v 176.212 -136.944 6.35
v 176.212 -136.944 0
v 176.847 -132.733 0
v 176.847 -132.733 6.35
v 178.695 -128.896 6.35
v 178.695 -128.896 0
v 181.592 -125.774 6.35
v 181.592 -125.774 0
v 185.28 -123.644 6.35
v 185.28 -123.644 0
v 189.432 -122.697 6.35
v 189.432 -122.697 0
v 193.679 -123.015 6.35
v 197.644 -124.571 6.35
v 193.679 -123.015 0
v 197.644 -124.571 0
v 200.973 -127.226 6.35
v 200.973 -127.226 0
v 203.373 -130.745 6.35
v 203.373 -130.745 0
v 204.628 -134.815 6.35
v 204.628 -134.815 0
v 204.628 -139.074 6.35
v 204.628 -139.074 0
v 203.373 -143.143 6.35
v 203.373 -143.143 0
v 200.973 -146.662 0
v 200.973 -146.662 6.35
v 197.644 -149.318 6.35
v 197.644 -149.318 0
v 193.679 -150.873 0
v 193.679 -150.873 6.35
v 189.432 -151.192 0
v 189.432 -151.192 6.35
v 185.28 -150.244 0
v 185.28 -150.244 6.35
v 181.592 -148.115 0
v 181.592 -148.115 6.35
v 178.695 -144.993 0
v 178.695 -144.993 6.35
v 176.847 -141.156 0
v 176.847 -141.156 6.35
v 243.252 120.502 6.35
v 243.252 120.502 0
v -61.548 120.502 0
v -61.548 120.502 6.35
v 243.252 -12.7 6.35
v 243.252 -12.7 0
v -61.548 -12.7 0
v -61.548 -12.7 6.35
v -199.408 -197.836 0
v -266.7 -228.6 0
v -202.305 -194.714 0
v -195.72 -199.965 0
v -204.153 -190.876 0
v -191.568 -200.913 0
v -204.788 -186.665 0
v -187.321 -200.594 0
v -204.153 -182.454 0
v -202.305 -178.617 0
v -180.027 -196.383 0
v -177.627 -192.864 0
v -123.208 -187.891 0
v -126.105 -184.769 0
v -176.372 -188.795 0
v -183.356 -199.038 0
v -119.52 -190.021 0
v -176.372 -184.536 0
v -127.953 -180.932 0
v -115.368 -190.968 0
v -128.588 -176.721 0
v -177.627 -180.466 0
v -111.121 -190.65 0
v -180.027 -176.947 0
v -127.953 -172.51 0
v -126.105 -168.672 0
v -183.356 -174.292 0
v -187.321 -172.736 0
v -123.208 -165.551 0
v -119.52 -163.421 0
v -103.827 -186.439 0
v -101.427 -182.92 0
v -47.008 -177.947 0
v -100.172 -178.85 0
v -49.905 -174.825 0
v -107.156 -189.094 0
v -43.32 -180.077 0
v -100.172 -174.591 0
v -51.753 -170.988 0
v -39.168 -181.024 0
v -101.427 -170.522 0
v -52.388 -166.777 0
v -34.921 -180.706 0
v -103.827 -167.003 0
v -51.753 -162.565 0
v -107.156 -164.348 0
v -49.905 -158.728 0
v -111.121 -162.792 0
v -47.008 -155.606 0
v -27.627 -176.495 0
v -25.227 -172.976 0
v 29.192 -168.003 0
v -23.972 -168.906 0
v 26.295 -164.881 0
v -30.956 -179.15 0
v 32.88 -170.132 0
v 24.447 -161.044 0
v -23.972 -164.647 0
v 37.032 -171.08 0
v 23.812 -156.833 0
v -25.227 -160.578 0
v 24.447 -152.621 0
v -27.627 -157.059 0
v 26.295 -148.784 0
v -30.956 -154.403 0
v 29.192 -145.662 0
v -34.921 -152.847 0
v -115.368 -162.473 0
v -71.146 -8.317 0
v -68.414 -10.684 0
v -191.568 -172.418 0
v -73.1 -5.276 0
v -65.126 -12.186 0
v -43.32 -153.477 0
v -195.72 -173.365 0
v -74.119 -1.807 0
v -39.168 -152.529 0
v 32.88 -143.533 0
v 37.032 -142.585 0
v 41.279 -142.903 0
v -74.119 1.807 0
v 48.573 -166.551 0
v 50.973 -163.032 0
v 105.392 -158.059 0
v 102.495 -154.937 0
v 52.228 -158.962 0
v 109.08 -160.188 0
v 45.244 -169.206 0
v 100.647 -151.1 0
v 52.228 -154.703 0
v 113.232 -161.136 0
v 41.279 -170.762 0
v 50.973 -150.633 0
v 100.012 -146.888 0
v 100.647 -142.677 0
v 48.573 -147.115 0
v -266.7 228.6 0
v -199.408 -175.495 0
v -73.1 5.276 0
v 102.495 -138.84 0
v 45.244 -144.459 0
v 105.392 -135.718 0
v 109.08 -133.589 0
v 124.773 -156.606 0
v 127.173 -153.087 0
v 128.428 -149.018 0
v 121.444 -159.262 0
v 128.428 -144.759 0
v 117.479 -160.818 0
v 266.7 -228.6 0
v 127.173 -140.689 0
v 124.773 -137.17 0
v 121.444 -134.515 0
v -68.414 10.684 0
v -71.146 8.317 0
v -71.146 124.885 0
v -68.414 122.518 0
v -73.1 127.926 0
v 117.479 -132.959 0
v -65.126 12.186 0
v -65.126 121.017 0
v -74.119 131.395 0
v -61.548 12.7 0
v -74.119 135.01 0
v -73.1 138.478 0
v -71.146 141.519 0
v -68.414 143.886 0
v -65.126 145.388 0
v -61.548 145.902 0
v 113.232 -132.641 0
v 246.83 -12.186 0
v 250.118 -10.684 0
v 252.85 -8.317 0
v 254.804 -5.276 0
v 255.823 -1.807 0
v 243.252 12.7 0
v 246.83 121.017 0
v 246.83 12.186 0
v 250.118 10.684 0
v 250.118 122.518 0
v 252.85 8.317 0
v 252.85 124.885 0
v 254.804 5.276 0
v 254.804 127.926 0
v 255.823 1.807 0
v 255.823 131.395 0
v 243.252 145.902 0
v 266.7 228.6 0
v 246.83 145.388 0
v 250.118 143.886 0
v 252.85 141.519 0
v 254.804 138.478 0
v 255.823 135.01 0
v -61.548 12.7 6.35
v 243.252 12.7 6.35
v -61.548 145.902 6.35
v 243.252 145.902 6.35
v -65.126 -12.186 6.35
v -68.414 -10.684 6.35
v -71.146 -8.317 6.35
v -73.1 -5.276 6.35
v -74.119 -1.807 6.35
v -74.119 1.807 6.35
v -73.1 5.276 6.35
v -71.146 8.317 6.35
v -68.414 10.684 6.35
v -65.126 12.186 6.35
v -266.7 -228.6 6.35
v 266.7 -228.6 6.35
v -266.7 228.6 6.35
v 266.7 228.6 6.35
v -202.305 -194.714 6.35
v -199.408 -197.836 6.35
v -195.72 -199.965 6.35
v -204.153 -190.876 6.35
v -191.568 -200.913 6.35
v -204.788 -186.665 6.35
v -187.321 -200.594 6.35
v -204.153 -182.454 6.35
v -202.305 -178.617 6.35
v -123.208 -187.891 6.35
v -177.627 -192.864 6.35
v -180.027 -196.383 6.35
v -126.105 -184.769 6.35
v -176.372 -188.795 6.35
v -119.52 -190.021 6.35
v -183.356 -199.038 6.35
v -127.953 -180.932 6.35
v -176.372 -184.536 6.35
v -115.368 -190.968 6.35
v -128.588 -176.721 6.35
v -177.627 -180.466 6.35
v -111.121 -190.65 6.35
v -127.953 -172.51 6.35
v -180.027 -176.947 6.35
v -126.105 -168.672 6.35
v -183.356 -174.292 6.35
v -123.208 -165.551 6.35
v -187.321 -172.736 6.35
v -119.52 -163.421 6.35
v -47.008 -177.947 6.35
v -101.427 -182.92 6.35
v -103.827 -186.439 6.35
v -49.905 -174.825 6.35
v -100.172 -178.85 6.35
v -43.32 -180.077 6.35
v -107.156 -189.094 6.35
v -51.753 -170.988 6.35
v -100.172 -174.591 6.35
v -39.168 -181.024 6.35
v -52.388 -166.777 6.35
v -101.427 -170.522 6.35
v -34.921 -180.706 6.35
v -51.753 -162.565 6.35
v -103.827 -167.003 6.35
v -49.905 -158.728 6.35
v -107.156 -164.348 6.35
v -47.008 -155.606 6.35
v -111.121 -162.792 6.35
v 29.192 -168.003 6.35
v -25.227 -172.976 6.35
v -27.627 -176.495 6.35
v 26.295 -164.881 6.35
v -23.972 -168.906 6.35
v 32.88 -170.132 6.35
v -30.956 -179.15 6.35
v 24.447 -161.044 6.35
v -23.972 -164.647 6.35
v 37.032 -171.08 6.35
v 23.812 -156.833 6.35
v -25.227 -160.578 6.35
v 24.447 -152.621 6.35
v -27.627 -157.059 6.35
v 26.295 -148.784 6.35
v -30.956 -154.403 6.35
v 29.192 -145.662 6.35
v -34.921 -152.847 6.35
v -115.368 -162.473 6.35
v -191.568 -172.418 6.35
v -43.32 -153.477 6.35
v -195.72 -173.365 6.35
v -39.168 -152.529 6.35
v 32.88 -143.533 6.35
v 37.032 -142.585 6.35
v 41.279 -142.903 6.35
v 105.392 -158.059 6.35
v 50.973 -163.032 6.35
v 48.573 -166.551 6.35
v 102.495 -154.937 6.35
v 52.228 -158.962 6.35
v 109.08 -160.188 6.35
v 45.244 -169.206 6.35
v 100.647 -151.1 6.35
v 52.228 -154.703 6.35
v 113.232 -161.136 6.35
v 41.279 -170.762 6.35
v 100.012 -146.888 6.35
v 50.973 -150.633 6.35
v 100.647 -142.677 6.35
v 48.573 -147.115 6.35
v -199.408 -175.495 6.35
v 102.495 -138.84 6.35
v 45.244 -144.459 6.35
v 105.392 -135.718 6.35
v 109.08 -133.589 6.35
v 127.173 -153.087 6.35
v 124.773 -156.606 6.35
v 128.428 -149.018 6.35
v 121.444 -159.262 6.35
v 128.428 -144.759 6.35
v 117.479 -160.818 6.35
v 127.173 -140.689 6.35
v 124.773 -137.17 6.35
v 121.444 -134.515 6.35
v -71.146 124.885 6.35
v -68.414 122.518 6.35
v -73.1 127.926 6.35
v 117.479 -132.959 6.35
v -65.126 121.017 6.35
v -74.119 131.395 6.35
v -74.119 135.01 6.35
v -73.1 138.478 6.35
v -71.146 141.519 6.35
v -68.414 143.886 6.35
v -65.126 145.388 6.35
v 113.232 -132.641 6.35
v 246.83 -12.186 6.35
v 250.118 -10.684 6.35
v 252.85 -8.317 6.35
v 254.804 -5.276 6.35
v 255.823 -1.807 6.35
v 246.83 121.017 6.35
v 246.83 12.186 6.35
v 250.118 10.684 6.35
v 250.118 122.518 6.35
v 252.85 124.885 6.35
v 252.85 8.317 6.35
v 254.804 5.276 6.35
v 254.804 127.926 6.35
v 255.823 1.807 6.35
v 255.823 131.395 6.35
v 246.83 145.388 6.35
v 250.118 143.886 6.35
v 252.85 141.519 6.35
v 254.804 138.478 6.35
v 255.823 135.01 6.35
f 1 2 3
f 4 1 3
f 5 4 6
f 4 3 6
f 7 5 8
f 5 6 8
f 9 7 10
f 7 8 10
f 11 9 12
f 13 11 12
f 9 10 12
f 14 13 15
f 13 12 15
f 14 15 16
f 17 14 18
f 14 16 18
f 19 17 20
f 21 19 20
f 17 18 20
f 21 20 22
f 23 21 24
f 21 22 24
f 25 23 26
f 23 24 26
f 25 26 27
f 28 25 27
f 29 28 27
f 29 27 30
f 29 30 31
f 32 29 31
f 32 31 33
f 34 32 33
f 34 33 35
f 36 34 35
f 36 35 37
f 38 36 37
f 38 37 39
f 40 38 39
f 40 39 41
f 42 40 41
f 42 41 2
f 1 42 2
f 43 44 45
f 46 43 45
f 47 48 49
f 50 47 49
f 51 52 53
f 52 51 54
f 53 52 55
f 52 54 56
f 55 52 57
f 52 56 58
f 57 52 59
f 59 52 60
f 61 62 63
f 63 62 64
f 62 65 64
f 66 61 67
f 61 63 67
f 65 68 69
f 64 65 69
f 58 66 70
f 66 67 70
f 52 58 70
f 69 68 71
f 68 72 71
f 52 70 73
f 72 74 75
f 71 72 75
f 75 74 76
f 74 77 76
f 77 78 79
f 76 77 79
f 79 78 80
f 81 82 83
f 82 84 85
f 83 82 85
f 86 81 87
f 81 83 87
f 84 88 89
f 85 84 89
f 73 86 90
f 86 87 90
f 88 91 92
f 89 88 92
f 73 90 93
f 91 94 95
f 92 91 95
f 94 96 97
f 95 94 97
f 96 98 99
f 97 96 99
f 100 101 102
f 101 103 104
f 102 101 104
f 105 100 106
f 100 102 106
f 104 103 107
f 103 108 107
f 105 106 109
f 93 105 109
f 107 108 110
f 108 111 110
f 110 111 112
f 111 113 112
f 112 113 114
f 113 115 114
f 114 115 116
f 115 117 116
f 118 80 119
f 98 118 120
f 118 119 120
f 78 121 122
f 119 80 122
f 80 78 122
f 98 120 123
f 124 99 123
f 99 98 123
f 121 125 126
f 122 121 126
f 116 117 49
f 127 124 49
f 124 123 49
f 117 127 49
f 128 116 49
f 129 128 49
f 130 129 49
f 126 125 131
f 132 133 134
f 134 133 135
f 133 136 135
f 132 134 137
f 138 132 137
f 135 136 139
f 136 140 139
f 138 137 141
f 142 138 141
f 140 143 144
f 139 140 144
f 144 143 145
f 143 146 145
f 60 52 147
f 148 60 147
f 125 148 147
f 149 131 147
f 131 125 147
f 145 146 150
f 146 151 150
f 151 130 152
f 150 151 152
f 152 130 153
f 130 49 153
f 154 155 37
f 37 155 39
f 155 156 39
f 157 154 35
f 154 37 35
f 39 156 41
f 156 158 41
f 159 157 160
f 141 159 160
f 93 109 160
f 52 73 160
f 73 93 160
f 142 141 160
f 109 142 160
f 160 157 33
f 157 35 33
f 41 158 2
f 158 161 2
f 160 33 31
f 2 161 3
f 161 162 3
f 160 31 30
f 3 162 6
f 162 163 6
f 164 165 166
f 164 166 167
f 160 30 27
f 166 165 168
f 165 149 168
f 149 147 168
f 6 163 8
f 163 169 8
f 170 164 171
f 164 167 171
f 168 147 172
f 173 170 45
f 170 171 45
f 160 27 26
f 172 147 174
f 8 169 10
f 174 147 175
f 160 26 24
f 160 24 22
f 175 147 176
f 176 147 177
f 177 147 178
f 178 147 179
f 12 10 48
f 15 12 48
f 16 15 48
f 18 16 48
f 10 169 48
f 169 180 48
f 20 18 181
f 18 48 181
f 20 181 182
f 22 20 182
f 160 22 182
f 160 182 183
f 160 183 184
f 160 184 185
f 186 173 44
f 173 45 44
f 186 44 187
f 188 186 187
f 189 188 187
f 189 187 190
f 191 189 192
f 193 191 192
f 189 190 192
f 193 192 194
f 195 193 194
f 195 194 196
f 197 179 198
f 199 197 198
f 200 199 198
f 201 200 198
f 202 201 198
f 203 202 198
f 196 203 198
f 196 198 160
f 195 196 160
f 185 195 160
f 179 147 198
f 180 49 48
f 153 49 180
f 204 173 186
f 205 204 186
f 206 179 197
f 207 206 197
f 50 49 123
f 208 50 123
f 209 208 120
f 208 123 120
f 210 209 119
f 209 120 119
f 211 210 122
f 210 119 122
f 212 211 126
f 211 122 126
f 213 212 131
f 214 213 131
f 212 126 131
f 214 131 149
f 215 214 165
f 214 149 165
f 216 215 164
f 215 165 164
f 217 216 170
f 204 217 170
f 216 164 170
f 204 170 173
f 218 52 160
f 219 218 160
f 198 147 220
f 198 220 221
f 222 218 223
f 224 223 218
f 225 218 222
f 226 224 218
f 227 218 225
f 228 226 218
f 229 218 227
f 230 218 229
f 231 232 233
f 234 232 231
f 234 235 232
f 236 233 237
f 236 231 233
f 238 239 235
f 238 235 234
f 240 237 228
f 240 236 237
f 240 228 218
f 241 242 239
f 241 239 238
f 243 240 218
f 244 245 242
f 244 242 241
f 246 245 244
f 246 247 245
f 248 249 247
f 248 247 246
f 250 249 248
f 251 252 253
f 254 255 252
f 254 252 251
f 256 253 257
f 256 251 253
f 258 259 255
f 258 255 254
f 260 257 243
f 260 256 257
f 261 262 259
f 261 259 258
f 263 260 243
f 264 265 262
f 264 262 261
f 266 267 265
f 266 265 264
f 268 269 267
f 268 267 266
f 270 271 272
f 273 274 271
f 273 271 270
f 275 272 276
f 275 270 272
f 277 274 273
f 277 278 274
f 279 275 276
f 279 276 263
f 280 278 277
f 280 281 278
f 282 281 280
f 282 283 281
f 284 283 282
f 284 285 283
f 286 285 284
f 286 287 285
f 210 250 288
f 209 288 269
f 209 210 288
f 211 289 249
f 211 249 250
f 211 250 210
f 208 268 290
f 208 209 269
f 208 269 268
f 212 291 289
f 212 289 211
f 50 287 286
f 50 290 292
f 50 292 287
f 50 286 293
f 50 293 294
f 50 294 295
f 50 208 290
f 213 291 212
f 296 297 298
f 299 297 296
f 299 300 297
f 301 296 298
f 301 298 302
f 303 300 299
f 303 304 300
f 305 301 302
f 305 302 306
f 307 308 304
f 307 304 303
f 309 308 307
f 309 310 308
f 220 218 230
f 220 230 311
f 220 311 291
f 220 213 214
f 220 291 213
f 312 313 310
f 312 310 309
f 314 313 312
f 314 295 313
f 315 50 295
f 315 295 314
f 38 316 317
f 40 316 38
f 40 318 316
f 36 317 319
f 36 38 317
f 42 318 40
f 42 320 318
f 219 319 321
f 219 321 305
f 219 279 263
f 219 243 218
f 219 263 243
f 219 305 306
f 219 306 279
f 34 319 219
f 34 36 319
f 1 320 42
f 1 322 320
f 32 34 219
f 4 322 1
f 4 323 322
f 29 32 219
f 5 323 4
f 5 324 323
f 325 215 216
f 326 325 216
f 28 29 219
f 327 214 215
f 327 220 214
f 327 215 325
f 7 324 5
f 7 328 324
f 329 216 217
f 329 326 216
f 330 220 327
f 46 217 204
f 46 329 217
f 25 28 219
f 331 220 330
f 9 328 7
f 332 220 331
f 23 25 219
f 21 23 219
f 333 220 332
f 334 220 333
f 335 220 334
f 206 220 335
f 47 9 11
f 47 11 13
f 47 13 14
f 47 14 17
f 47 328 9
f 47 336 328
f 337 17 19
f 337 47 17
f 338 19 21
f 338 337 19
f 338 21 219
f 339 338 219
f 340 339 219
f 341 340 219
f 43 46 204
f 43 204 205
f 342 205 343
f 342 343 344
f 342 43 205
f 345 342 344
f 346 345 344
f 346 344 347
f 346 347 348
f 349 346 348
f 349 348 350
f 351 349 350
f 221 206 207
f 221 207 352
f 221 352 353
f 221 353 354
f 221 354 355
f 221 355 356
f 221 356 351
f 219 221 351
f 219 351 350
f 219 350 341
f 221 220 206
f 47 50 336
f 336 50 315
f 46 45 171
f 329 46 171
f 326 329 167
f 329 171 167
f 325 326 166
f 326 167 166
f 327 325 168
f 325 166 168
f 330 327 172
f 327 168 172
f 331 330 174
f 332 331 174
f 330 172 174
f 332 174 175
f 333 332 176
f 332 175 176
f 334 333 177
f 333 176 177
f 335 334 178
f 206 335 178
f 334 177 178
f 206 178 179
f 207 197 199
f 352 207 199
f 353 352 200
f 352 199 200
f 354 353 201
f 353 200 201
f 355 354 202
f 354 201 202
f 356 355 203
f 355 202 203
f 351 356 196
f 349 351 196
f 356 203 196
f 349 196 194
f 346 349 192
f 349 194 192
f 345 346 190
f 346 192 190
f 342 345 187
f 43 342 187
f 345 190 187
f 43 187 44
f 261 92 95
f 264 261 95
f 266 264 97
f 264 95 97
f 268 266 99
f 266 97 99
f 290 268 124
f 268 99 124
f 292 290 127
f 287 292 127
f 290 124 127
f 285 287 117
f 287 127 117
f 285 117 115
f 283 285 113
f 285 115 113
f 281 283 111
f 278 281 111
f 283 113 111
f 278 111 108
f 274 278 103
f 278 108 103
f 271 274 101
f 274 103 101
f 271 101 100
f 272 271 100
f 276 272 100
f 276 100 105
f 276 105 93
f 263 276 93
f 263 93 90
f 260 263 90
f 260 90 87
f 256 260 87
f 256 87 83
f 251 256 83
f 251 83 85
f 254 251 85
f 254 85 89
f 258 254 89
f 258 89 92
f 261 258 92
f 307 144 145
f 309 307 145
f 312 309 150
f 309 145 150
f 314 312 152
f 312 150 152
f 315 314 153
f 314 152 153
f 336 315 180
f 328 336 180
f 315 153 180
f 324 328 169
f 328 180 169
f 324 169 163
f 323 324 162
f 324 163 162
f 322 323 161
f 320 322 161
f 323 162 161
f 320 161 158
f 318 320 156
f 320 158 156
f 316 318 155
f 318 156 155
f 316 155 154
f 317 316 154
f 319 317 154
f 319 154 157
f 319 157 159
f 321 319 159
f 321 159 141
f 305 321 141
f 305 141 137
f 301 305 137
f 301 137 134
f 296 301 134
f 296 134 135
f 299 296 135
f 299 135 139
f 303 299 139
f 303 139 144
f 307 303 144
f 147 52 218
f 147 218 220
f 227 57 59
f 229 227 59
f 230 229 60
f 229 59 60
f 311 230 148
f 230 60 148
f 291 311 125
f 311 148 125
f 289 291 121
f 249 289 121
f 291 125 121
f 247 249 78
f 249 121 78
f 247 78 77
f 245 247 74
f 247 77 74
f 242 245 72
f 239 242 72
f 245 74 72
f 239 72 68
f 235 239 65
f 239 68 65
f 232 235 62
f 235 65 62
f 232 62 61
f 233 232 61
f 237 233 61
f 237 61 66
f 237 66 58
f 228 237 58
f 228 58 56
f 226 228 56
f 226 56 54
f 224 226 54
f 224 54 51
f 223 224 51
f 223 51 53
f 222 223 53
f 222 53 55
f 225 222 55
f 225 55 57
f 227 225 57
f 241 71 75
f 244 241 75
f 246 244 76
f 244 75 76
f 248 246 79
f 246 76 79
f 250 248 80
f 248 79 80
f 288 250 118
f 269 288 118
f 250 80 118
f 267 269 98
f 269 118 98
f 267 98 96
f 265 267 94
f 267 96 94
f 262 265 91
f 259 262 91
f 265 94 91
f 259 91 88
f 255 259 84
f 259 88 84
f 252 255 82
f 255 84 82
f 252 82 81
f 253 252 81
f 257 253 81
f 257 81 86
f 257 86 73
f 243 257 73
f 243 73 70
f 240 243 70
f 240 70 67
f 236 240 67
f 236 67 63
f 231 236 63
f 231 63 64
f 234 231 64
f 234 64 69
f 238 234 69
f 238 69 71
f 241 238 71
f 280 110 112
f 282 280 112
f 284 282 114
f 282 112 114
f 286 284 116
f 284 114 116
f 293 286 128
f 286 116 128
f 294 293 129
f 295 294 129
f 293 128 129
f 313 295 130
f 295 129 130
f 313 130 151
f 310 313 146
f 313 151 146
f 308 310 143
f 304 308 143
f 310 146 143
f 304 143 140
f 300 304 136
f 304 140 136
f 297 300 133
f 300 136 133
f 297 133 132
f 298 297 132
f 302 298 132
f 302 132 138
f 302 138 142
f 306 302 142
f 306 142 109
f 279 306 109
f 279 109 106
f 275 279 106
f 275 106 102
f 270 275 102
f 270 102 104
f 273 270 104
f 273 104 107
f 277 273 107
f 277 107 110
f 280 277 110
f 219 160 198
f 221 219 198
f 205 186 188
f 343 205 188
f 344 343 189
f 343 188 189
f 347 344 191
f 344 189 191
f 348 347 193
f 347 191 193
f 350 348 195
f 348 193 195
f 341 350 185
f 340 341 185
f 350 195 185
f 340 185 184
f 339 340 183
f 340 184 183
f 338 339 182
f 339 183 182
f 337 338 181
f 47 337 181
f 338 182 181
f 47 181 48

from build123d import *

# Parameters (mm, degrees)
SKETCH1_W           = 533.4
SKETCH1_H           = 457.2
BOSS_EXTRUDE4_DEPTH = 6.35
SKETCH3_R           = 14.2875
CUT_EXTRUDE2_DEPTH  = 12.7


with BuildPart() as part:
    # Sketch1 → Boss-Extrude4 (new body)
    with BuildSketch(Plane.XY):
        Rectangle(SKETCH1_W, SKETCH1_H)
        with BuildLine():
            Line((-61.54804751, 145.902211593), (243.25195249, 145.902211593))
            ThreePointArc((243.25195249, 145.902211593), (255.95195249, 133.202211593), (243.25195249, 120.502211593))
            Line((243.25195249, 120.502211593), (-61.54804751, 120.502211593))
            ThreePointArc((-61.54804751, 120.502211593), (-74.24804751, 133.202211593), (-61.54804751, 145.902211593))
        make_face(mode=Mode.SUBTRACT)
        with BuildLine():
            Line((-61.54804751, 12.7), (243.25195249, 12.7))
            ThreePointArc((243.25195249, 12.7), (255.95195249, 0), (243.25195249, -12.7))
            Line((243.25195249, -12.7), (-61.54804751, -12.7))
            ThreePointArc((-61.54804751, -12.7), (-74.24804751, 0), (-61.54804751, 12.7))
        make_face(mode=Mode.SUBTRACT)
    extrude(amount=BOSS_EXTRUDE4_DEPTH)

    # Sketch3 → Cut-Extrude2 (cut)
    with BuildSketch(Plane(origin=(0, 0, 0), x_dir=(-1, 0, 0), z_dir=(0, 0, -1))):
        with Locations((-190.5, -136.944186205)):
            Circle(SKETCH3_R)
        with Locations((-114.3, -146.88837241)):
            Circle(SKETCH3_R)
        with Locations((-38.1, -156.832558615)):
            Circle(SKETCH3_R)
        with Locations((38.1, -166.77674482)):
            Circle(SKETCH3_R)
        with Locations((114.3, -176.720931025)):
            Circle(SKETCH3_R)
        with Locations((190.5, -186.66511723)):
            Circle(SKETCH3_R)
    extrude(amount=-CUT_EXTRUDE2_DEPTH, mode=Mode.SUBTRACT)


solid = part.part
